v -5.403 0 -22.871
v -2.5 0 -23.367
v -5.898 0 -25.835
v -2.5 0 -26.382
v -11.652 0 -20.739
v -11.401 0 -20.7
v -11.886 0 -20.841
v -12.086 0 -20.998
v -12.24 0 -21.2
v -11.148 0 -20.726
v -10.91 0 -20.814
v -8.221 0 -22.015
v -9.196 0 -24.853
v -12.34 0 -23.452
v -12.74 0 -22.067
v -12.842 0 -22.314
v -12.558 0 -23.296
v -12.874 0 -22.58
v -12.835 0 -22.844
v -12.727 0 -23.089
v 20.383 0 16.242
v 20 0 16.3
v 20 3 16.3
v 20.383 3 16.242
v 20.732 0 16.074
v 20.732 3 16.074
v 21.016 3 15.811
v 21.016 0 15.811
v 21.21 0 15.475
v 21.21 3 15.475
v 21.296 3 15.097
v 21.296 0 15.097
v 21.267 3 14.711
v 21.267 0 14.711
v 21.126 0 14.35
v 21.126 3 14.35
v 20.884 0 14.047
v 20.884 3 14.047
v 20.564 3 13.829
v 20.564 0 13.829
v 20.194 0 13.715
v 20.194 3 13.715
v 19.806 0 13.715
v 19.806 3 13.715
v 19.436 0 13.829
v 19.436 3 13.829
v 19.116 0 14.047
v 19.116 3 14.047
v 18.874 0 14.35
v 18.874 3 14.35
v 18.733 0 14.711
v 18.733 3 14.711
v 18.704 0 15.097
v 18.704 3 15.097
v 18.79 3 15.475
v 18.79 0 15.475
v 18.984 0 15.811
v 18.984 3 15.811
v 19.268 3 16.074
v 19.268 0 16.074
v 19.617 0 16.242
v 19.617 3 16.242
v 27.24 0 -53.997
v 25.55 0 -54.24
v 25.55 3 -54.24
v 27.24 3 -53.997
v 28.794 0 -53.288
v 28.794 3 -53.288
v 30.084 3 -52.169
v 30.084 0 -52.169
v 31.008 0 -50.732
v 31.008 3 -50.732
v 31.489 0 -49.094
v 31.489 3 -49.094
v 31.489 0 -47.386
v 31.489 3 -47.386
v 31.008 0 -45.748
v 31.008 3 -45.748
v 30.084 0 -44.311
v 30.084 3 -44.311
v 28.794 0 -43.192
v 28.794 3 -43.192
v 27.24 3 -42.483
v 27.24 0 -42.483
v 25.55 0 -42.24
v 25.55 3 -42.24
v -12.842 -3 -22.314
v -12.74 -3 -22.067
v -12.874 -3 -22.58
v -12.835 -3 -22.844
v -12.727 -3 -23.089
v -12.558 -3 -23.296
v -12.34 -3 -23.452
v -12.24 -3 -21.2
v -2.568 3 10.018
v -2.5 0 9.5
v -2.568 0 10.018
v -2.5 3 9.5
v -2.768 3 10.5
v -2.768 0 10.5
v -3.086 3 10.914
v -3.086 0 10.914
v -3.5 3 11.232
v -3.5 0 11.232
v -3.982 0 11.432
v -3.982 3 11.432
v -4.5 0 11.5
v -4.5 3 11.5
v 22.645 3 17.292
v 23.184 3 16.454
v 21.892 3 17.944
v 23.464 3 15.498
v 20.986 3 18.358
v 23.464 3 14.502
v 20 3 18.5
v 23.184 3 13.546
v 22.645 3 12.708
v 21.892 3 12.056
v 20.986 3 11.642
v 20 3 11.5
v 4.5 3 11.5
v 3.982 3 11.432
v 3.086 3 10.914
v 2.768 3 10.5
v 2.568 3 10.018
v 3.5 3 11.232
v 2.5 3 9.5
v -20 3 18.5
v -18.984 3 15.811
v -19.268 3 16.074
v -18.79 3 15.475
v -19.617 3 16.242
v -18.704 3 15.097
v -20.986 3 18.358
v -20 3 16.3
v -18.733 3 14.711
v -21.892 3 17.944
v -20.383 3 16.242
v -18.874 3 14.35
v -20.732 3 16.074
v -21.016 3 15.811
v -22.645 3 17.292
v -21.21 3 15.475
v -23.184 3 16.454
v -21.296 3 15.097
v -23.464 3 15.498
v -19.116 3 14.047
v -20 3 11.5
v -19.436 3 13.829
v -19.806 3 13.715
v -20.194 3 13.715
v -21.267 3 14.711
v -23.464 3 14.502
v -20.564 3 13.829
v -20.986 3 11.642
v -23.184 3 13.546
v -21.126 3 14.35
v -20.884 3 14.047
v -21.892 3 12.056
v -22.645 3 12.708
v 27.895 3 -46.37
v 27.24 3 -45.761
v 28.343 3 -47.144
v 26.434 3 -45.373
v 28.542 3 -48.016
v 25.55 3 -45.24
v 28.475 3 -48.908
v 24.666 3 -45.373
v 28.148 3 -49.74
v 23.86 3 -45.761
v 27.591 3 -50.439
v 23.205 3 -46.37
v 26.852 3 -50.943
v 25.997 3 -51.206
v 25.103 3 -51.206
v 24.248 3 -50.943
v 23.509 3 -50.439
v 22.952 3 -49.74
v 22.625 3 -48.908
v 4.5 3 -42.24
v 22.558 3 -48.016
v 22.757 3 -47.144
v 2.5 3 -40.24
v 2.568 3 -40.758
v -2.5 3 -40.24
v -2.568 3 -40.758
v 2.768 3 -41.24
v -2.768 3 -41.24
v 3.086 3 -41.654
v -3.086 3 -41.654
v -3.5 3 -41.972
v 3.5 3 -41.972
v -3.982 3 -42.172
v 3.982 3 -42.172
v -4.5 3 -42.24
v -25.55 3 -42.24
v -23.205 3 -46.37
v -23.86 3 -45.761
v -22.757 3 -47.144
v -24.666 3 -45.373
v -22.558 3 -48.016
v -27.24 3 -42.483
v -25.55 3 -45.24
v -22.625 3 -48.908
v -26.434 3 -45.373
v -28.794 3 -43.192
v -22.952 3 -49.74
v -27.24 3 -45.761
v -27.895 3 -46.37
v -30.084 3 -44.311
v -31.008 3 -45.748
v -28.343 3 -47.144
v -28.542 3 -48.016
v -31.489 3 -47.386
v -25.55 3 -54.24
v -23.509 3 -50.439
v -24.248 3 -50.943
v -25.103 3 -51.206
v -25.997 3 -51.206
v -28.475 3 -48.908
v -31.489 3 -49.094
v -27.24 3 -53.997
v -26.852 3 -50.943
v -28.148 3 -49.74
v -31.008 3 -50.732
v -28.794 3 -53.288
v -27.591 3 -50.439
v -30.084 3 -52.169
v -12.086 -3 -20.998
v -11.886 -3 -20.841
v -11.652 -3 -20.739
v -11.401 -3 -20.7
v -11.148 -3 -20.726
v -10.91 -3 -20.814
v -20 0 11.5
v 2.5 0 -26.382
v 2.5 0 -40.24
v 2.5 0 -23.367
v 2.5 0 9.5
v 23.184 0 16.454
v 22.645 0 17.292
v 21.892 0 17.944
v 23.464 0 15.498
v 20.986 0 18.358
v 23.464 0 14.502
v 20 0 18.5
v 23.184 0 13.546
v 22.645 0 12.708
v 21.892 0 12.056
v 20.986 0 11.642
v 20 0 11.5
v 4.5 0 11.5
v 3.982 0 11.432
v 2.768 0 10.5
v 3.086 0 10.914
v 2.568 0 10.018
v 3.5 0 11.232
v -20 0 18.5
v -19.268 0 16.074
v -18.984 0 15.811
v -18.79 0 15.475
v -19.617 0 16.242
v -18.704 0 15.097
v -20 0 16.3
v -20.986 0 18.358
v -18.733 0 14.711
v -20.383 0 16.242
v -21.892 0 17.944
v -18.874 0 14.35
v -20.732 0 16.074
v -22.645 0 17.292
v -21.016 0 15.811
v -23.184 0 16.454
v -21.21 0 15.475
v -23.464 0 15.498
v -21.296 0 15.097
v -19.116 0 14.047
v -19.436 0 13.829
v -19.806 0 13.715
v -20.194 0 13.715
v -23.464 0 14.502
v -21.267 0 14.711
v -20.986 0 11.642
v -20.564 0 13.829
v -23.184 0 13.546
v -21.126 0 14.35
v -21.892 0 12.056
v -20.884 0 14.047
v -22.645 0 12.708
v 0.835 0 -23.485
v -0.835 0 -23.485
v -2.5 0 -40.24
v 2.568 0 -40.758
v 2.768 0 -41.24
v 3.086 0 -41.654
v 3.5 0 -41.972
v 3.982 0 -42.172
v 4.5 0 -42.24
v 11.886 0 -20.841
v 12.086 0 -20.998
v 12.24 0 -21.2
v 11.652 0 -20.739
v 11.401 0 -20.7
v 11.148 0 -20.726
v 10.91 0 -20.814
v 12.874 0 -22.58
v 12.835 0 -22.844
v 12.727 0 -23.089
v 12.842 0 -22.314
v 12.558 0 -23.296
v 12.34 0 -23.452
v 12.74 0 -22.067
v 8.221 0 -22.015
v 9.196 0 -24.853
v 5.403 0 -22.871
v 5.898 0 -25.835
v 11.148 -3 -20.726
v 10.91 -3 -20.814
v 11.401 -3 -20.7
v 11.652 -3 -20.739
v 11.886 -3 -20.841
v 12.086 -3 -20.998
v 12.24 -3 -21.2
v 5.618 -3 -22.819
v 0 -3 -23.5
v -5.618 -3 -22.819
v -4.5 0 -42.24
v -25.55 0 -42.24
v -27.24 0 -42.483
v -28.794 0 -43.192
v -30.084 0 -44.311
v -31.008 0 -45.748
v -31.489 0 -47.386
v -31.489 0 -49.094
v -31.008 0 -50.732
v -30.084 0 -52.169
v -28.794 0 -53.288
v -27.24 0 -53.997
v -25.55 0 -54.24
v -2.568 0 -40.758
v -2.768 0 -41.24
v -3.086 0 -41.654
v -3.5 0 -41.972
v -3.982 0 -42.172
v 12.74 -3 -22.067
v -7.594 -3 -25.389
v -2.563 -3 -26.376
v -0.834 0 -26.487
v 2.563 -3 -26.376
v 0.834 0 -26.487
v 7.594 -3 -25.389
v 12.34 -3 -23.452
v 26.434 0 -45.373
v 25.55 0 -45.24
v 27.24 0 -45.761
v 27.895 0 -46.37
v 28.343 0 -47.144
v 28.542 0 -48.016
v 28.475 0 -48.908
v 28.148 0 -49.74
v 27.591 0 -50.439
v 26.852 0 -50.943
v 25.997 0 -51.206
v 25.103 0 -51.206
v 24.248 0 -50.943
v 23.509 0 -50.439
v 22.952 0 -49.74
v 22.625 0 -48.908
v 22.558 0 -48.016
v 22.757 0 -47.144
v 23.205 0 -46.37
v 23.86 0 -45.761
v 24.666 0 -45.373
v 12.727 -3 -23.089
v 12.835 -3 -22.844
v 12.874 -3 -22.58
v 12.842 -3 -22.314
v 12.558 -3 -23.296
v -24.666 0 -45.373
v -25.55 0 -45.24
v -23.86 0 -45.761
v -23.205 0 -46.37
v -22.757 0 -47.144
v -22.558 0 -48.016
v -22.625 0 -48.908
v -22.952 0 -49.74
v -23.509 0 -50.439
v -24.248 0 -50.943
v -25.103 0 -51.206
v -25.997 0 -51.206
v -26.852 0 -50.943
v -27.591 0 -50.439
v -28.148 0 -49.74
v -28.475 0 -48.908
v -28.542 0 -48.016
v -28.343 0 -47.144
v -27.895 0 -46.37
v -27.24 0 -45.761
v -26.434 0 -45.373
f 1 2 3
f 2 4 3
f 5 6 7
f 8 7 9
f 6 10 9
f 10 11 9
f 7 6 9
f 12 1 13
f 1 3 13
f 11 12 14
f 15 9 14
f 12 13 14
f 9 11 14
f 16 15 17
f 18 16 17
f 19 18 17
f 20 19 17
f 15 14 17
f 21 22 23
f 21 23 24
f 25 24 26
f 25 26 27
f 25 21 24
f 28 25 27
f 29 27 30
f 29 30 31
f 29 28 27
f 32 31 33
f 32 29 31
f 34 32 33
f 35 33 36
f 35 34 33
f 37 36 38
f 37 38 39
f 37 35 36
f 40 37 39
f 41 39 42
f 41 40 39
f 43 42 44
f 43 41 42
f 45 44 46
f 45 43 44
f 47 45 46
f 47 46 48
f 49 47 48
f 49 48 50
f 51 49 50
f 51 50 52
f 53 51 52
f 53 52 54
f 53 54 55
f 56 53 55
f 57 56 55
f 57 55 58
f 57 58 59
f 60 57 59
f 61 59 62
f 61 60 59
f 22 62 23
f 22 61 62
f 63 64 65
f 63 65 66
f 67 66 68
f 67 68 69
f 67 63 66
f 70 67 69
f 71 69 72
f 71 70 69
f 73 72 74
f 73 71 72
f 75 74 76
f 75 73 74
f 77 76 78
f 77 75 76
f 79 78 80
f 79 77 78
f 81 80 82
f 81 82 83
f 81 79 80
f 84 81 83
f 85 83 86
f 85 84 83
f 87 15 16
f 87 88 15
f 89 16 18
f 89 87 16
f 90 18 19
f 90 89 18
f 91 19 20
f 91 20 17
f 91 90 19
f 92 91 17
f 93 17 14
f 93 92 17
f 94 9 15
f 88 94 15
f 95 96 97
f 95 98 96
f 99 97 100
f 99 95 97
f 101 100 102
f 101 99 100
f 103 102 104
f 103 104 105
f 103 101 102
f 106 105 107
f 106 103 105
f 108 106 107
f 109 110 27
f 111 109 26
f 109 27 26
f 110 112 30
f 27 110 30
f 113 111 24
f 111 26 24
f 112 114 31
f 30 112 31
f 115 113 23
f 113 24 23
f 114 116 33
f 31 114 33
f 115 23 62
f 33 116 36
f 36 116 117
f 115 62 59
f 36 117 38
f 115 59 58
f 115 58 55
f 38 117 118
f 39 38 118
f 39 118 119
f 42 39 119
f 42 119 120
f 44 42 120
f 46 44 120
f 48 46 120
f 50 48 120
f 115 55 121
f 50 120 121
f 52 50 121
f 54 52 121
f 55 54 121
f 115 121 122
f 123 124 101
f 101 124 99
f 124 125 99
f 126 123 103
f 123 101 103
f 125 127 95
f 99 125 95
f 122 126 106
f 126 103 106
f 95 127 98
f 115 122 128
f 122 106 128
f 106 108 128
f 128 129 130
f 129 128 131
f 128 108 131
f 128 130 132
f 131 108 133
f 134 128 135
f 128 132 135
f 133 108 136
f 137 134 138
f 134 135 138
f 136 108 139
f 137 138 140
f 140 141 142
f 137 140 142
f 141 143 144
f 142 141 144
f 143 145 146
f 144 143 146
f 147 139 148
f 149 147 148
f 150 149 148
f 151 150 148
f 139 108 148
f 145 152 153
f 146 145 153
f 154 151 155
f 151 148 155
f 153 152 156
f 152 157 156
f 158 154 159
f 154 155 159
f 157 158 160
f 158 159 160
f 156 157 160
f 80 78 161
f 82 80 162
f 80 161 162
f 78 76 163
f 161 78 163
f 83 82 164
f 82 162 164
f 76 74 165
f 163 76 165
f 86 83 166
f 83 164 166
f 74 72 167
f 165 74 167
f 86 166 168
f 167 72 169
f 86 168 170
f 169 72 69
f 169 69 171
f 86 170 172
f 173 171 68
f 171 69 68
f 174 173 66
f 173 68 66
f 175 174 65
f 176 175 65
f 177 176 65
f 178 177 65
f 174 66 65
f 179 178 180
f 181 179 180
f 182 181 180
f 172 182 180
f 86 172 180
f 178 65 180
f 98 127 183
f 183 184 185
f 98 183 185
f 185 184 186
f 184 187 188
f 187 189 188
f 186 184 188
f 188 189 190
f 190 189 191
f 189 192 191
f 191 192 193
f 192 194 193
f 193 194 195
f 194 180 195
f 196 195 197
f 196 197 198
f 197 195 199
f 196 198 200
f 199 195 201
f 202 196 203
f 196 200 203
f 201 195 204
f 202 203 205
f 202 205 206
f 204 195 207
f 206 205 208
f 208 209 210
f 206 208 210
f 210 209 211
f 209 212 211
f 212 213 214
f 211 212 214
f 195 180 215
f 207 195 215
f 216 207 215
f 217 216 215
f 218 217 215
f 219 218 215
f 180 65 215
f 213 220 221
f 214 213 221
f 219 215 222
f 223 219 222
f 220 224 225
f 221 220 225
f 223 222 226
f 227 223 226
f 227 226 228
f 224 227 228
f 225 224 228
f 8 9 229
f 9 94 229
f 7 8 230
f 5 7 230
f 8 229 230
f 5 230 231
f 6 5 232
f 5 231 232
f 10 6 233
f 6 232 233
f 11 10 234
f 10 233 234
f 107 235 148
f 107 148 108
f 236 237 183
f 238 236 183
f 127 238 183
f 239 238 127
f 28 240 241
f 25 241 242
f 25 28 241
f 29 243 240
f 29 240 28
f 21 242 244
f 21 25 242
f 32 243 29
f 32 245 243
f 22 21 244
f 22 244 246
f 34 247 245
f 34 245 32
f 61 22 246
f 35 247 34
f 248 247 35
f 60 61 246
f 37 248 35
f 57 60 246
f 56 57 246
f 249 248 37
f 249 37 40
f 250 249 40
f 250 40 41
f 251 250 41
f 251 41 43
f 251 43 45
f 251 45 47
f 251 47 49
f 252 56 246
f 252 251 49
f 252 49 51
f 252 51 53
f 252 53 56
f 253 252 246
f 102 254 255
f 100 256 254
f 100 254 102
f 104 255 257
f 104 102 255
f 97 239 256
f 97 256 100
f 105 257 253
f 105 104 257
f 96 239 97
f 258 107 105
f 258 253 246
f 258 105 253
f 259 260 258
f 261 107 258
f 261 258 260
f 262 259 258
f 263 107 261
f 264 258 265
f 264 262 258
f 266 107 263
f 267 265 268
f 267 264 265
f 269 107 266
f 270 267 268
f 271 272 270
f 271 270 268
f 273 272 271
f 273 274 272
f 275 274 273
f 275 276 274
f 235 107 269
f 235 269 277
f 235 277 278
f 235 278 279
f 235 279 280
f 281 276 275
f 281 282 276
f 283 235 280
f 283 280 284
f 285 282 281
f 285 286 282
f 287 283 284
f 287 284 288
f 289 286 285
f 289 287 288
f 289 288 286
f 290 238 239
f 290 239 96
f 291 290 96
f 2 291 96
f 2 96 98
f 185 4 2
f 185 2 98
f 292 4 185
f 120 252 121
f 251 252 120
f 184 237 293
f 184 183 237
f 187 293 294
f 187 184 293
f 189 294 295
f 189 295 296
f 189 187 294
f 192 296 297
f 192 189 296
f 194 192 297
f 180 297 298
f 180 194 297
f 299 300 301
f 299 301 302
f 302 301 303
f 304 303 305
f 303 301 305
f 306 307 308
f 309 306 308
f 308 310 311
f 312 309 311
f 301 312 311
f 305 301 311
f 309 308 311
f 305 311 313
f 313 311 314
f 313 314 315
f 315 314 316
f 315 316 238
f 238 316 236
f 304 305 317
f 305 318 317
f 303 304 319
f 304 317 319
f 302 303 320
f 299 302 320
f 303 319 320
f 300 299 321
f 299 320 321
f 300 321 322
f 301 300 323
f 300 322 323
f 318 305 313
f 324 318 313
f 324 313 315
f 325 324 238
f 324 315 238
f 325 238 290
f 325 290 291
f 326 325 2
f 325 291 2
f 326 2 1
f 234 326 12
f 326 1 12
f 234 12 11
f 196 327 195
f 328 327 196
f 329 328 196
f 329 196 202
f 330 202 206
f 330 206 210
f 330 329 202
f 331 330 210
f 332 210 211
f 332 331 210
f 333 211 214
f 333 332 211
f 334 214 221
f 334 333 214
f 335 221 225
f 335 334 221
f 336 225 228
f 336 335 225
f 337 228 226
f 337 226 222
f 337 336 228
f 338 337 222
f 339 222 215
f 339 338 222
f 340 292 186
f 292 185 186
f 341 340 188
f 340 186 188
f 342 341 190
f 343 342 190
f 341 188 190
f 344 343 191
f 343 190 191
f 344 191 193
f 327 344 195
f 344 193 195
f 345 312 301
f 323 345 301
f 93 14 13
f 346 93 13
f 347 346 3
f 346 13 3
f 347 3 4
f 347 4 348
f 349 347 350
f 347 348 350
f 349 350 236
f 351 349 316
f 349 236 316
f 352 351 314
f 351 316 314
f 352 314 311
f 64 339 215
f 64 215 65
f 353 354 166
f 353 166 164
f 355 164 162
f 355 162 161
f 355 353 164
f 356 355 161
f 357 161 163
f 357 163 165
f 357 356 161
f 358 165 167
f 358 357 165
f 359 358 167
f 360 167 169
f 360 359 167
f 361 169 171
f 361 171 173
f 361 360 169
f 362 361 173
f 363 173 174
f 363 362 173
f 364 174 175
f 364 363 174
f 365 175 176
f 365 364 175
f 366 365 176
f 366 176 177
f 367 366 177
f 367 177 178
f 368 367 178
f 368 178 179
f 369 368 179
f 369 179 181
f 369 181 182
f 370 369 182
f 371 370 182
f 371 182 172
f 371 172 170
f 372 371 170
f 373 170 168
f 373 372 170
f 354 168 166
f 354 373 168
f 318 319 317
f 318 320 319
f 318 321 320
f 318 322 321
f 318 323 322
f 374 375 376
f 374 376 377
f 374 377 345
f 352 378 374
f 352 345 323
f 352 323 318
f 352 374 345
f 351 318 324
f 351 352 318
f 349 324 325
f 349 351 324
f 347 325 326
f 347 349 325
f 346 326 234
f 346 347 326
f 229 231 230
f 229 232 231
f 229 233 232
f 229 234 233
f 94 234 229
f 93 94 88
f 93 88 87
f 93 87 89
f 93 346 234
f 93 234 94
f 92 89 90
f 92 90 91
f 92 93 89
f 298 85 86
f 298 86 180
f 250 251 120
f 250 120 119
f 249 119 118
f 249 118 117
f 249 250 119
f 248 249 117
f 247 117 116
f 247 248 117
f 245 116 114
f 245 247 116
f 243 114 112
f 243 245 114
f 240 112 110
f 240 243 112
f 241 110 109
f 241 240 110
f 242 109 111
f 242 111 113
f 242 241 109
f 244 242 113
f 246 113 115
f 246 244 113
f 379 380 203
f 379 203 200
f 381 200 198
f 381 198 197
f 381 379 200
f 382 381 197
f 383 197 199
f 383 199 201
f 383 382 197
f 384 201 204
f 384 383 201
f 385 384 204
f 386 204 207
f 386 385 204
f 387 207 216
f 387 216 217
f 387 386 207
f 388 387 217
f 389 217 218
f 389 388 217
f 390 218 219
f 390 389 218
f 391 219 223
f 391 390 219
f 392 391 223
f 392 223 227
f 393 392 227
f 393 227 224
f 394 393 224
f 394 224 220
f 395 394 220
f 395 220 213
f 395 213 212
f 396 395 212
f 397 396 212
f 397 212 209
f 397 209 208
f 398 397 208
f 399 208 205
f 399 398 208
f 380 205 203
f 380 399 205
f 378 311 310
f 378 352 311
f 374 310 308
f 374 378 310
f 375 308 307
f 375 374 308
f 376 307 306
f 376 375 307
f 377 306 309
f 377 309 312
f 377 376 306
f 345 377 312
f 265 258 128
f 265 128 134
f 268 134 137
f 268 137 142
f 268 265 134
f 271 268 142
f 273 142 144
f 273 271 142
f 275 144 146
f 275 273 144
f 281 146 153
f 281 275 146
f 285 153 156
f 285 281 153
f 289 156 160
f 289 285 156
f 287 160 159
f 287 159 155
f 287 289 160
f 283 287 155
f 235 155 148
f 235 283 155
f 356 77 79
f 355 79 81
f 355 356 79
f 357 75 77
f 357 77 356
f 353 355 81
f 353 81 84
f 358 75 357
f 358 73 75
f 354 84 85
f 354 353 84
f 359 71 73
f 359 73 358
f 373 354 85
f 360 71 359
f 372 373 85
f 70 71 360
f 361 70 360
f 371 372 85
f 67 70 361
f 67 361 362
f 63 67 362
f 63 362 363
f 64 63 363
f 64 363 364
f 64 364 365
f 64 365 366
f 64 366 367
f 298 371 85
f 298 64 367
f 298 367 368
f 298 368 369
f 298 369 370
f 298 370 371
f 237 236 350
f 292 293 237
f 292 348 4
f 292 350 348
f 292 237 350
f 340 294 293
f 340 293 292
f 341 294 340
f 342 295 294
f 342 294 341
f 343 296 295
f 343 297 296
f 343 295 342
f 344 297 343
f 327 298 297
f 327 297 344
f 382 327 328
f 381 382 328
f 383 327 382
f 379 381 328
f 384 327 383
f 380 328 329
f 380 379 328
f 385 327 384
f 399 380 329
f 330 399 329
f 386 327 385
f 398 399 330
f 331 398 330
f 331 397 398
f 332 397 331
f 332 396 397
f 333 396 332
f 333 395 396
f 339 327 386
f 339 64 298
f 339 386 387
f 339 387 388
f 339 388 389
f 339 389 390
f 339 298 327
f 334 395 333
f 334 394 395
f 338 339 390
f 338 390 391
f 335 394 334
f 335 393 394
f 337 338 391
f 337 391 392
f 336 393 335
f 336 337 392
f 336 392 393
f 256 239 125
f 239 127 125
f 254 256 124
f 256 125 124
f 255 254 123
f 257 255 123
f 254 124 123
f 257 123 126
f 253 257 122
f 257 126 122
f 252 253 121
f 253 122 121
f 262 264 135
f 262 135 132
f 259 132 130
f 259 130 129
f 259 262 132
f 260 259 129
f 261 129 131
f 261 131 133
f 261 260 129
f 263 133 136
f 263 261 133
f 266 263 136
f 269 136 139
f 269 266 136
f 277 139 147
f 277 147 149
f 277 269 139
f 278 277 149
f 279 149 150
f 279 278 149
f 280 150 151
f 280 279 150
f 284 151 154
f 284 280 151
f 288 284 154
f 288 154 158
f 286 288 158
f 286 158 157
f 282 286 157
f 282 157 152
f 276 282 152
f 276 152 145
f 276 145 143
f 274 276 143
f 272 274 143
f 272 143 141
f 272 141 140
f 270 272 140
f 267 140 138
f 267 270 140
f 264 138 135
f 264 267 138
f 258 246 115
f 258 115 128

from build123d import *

# Parameters (mm, degrees)
SKETCH1_R           = 1.3
SKETCH1_R_2         = 3
BOSS_EXTRUDE4_DEPTH = 3
BOSS_EXTRUDE5_DEPTH = 3
FILLET4_R           = 1
FILLET5_R           = 2


with BuildPart() as part:
    # Sketch1 → Boss-Extrude4 (new body)
    with BuildSketch(Plane(origin=(0, 0, 0), x_dir=(1, 0, 0), z_dir=(0, 1, 0))):
        with BuildLine():
            Line((-25.55, 54.240000374), (25.55, 54.240000374))
            ThreePointArc((25.55, 54.240000374), (31.550000374, 48.24), (25.55, 42.239999626))
            Line((25.55, 42.239999626), (2.5, 42.239999626))
            Line((2.5, 42.239999626), (2.5, -11.500002156))
            Line((2.5, -11.500002156), (20, -11.500003832))
            ThreePointArc((20, -11.500003832), (23.499996168, -15), (20, -18.499996168))
            Line((20, -18.499996168), (-20, -18.5))
            ThreePointArc((-20, -18.5), (-23.5, -15), (-20, -11.5))
            Line((-20, -11.5), (-2.5, -11.500001677))
            Line((-2.5, -11.500001677), (-2.5, 42.239999626))
            Line((-2.5, 42.239999626), (-25.55, 42.239999626))
            ThreePointArc((-25.55, 42.239999626), (-31.550000374, 48.24), (-25.55, 54.240000374))
        make_face()
        with Locations(Location((-20, -15, 0), (0, 0, 270))):
            Circle(SKETCH1_R, mode=Mode.SUBTRACT)
        with Locations(Location((20, -15, 0), (0, 0, 270))):
            Circle(SKETCH1_R, mode=Mode.SUBTRACT)
        with Locations(Location((25.55, 48.24, 0), (0, 0, 270))):
            Circle(SKETCH1_R_2, mode=Mode.SUBTRACT)
        with Locations(Location((-25.55, 48.24, 0), (0, 0, 270))):
            Circle(SKETCH1_R_2, mode=Mode.SUBTRACT)
    extrude(amount=BOSS_EXTRUDE4_DEPTH)

    # Sketch2 → Boss-Extrude5 (add)
    with BuildSketch(Plane(origin=(0, 0, 0), x_dir=(1, 0, 0), z_dir=(0, 1, 0))):
        with BuildLine():
            Line((-11.75, 20.351596989), (-13.25, 22.9496732))
            ThreePointArc((-13.25, 22.9496732), (0, 26.5), (13.25, 22.9496732))
            Line((13.25, 22.9496732), (11.75, 20.351596989))
            ThreePointArc((11.75, 20.351596989), (0, 23.5), (-11.75, 20.351596989))
        make_face()
    extrude(amount=-BOSS_EXTRUDE5_DEPTH)

    # Fillet4
    fillet4_edges = [part.edges().sort_by_distance(p)[0] for p in [
        (-13.25, -1.5, -22.9496732),
        (13.25, -1.5, -22.9496732),
        (11.75, -1.5, -20.351596989),
        (-11.75, -1.5, -20.351596989),
    ]]
    fillet(fillet4_edges, radius=FILLET4_R)

    # Fillet5
    fillet5_edges = [part.edges().sort_by_distance(p)[0] for p in [
        (-2.5, 1.5, 11.500001677),
        (-2.5, 1.5, -42.239999626),
        (2.5, 1.5, -42.239999626),
        (2.5, 1.5, 11.500002156),
    ]]
    fillet(fillet5_edges, radius=FILLET5_R)


solid = part.part
